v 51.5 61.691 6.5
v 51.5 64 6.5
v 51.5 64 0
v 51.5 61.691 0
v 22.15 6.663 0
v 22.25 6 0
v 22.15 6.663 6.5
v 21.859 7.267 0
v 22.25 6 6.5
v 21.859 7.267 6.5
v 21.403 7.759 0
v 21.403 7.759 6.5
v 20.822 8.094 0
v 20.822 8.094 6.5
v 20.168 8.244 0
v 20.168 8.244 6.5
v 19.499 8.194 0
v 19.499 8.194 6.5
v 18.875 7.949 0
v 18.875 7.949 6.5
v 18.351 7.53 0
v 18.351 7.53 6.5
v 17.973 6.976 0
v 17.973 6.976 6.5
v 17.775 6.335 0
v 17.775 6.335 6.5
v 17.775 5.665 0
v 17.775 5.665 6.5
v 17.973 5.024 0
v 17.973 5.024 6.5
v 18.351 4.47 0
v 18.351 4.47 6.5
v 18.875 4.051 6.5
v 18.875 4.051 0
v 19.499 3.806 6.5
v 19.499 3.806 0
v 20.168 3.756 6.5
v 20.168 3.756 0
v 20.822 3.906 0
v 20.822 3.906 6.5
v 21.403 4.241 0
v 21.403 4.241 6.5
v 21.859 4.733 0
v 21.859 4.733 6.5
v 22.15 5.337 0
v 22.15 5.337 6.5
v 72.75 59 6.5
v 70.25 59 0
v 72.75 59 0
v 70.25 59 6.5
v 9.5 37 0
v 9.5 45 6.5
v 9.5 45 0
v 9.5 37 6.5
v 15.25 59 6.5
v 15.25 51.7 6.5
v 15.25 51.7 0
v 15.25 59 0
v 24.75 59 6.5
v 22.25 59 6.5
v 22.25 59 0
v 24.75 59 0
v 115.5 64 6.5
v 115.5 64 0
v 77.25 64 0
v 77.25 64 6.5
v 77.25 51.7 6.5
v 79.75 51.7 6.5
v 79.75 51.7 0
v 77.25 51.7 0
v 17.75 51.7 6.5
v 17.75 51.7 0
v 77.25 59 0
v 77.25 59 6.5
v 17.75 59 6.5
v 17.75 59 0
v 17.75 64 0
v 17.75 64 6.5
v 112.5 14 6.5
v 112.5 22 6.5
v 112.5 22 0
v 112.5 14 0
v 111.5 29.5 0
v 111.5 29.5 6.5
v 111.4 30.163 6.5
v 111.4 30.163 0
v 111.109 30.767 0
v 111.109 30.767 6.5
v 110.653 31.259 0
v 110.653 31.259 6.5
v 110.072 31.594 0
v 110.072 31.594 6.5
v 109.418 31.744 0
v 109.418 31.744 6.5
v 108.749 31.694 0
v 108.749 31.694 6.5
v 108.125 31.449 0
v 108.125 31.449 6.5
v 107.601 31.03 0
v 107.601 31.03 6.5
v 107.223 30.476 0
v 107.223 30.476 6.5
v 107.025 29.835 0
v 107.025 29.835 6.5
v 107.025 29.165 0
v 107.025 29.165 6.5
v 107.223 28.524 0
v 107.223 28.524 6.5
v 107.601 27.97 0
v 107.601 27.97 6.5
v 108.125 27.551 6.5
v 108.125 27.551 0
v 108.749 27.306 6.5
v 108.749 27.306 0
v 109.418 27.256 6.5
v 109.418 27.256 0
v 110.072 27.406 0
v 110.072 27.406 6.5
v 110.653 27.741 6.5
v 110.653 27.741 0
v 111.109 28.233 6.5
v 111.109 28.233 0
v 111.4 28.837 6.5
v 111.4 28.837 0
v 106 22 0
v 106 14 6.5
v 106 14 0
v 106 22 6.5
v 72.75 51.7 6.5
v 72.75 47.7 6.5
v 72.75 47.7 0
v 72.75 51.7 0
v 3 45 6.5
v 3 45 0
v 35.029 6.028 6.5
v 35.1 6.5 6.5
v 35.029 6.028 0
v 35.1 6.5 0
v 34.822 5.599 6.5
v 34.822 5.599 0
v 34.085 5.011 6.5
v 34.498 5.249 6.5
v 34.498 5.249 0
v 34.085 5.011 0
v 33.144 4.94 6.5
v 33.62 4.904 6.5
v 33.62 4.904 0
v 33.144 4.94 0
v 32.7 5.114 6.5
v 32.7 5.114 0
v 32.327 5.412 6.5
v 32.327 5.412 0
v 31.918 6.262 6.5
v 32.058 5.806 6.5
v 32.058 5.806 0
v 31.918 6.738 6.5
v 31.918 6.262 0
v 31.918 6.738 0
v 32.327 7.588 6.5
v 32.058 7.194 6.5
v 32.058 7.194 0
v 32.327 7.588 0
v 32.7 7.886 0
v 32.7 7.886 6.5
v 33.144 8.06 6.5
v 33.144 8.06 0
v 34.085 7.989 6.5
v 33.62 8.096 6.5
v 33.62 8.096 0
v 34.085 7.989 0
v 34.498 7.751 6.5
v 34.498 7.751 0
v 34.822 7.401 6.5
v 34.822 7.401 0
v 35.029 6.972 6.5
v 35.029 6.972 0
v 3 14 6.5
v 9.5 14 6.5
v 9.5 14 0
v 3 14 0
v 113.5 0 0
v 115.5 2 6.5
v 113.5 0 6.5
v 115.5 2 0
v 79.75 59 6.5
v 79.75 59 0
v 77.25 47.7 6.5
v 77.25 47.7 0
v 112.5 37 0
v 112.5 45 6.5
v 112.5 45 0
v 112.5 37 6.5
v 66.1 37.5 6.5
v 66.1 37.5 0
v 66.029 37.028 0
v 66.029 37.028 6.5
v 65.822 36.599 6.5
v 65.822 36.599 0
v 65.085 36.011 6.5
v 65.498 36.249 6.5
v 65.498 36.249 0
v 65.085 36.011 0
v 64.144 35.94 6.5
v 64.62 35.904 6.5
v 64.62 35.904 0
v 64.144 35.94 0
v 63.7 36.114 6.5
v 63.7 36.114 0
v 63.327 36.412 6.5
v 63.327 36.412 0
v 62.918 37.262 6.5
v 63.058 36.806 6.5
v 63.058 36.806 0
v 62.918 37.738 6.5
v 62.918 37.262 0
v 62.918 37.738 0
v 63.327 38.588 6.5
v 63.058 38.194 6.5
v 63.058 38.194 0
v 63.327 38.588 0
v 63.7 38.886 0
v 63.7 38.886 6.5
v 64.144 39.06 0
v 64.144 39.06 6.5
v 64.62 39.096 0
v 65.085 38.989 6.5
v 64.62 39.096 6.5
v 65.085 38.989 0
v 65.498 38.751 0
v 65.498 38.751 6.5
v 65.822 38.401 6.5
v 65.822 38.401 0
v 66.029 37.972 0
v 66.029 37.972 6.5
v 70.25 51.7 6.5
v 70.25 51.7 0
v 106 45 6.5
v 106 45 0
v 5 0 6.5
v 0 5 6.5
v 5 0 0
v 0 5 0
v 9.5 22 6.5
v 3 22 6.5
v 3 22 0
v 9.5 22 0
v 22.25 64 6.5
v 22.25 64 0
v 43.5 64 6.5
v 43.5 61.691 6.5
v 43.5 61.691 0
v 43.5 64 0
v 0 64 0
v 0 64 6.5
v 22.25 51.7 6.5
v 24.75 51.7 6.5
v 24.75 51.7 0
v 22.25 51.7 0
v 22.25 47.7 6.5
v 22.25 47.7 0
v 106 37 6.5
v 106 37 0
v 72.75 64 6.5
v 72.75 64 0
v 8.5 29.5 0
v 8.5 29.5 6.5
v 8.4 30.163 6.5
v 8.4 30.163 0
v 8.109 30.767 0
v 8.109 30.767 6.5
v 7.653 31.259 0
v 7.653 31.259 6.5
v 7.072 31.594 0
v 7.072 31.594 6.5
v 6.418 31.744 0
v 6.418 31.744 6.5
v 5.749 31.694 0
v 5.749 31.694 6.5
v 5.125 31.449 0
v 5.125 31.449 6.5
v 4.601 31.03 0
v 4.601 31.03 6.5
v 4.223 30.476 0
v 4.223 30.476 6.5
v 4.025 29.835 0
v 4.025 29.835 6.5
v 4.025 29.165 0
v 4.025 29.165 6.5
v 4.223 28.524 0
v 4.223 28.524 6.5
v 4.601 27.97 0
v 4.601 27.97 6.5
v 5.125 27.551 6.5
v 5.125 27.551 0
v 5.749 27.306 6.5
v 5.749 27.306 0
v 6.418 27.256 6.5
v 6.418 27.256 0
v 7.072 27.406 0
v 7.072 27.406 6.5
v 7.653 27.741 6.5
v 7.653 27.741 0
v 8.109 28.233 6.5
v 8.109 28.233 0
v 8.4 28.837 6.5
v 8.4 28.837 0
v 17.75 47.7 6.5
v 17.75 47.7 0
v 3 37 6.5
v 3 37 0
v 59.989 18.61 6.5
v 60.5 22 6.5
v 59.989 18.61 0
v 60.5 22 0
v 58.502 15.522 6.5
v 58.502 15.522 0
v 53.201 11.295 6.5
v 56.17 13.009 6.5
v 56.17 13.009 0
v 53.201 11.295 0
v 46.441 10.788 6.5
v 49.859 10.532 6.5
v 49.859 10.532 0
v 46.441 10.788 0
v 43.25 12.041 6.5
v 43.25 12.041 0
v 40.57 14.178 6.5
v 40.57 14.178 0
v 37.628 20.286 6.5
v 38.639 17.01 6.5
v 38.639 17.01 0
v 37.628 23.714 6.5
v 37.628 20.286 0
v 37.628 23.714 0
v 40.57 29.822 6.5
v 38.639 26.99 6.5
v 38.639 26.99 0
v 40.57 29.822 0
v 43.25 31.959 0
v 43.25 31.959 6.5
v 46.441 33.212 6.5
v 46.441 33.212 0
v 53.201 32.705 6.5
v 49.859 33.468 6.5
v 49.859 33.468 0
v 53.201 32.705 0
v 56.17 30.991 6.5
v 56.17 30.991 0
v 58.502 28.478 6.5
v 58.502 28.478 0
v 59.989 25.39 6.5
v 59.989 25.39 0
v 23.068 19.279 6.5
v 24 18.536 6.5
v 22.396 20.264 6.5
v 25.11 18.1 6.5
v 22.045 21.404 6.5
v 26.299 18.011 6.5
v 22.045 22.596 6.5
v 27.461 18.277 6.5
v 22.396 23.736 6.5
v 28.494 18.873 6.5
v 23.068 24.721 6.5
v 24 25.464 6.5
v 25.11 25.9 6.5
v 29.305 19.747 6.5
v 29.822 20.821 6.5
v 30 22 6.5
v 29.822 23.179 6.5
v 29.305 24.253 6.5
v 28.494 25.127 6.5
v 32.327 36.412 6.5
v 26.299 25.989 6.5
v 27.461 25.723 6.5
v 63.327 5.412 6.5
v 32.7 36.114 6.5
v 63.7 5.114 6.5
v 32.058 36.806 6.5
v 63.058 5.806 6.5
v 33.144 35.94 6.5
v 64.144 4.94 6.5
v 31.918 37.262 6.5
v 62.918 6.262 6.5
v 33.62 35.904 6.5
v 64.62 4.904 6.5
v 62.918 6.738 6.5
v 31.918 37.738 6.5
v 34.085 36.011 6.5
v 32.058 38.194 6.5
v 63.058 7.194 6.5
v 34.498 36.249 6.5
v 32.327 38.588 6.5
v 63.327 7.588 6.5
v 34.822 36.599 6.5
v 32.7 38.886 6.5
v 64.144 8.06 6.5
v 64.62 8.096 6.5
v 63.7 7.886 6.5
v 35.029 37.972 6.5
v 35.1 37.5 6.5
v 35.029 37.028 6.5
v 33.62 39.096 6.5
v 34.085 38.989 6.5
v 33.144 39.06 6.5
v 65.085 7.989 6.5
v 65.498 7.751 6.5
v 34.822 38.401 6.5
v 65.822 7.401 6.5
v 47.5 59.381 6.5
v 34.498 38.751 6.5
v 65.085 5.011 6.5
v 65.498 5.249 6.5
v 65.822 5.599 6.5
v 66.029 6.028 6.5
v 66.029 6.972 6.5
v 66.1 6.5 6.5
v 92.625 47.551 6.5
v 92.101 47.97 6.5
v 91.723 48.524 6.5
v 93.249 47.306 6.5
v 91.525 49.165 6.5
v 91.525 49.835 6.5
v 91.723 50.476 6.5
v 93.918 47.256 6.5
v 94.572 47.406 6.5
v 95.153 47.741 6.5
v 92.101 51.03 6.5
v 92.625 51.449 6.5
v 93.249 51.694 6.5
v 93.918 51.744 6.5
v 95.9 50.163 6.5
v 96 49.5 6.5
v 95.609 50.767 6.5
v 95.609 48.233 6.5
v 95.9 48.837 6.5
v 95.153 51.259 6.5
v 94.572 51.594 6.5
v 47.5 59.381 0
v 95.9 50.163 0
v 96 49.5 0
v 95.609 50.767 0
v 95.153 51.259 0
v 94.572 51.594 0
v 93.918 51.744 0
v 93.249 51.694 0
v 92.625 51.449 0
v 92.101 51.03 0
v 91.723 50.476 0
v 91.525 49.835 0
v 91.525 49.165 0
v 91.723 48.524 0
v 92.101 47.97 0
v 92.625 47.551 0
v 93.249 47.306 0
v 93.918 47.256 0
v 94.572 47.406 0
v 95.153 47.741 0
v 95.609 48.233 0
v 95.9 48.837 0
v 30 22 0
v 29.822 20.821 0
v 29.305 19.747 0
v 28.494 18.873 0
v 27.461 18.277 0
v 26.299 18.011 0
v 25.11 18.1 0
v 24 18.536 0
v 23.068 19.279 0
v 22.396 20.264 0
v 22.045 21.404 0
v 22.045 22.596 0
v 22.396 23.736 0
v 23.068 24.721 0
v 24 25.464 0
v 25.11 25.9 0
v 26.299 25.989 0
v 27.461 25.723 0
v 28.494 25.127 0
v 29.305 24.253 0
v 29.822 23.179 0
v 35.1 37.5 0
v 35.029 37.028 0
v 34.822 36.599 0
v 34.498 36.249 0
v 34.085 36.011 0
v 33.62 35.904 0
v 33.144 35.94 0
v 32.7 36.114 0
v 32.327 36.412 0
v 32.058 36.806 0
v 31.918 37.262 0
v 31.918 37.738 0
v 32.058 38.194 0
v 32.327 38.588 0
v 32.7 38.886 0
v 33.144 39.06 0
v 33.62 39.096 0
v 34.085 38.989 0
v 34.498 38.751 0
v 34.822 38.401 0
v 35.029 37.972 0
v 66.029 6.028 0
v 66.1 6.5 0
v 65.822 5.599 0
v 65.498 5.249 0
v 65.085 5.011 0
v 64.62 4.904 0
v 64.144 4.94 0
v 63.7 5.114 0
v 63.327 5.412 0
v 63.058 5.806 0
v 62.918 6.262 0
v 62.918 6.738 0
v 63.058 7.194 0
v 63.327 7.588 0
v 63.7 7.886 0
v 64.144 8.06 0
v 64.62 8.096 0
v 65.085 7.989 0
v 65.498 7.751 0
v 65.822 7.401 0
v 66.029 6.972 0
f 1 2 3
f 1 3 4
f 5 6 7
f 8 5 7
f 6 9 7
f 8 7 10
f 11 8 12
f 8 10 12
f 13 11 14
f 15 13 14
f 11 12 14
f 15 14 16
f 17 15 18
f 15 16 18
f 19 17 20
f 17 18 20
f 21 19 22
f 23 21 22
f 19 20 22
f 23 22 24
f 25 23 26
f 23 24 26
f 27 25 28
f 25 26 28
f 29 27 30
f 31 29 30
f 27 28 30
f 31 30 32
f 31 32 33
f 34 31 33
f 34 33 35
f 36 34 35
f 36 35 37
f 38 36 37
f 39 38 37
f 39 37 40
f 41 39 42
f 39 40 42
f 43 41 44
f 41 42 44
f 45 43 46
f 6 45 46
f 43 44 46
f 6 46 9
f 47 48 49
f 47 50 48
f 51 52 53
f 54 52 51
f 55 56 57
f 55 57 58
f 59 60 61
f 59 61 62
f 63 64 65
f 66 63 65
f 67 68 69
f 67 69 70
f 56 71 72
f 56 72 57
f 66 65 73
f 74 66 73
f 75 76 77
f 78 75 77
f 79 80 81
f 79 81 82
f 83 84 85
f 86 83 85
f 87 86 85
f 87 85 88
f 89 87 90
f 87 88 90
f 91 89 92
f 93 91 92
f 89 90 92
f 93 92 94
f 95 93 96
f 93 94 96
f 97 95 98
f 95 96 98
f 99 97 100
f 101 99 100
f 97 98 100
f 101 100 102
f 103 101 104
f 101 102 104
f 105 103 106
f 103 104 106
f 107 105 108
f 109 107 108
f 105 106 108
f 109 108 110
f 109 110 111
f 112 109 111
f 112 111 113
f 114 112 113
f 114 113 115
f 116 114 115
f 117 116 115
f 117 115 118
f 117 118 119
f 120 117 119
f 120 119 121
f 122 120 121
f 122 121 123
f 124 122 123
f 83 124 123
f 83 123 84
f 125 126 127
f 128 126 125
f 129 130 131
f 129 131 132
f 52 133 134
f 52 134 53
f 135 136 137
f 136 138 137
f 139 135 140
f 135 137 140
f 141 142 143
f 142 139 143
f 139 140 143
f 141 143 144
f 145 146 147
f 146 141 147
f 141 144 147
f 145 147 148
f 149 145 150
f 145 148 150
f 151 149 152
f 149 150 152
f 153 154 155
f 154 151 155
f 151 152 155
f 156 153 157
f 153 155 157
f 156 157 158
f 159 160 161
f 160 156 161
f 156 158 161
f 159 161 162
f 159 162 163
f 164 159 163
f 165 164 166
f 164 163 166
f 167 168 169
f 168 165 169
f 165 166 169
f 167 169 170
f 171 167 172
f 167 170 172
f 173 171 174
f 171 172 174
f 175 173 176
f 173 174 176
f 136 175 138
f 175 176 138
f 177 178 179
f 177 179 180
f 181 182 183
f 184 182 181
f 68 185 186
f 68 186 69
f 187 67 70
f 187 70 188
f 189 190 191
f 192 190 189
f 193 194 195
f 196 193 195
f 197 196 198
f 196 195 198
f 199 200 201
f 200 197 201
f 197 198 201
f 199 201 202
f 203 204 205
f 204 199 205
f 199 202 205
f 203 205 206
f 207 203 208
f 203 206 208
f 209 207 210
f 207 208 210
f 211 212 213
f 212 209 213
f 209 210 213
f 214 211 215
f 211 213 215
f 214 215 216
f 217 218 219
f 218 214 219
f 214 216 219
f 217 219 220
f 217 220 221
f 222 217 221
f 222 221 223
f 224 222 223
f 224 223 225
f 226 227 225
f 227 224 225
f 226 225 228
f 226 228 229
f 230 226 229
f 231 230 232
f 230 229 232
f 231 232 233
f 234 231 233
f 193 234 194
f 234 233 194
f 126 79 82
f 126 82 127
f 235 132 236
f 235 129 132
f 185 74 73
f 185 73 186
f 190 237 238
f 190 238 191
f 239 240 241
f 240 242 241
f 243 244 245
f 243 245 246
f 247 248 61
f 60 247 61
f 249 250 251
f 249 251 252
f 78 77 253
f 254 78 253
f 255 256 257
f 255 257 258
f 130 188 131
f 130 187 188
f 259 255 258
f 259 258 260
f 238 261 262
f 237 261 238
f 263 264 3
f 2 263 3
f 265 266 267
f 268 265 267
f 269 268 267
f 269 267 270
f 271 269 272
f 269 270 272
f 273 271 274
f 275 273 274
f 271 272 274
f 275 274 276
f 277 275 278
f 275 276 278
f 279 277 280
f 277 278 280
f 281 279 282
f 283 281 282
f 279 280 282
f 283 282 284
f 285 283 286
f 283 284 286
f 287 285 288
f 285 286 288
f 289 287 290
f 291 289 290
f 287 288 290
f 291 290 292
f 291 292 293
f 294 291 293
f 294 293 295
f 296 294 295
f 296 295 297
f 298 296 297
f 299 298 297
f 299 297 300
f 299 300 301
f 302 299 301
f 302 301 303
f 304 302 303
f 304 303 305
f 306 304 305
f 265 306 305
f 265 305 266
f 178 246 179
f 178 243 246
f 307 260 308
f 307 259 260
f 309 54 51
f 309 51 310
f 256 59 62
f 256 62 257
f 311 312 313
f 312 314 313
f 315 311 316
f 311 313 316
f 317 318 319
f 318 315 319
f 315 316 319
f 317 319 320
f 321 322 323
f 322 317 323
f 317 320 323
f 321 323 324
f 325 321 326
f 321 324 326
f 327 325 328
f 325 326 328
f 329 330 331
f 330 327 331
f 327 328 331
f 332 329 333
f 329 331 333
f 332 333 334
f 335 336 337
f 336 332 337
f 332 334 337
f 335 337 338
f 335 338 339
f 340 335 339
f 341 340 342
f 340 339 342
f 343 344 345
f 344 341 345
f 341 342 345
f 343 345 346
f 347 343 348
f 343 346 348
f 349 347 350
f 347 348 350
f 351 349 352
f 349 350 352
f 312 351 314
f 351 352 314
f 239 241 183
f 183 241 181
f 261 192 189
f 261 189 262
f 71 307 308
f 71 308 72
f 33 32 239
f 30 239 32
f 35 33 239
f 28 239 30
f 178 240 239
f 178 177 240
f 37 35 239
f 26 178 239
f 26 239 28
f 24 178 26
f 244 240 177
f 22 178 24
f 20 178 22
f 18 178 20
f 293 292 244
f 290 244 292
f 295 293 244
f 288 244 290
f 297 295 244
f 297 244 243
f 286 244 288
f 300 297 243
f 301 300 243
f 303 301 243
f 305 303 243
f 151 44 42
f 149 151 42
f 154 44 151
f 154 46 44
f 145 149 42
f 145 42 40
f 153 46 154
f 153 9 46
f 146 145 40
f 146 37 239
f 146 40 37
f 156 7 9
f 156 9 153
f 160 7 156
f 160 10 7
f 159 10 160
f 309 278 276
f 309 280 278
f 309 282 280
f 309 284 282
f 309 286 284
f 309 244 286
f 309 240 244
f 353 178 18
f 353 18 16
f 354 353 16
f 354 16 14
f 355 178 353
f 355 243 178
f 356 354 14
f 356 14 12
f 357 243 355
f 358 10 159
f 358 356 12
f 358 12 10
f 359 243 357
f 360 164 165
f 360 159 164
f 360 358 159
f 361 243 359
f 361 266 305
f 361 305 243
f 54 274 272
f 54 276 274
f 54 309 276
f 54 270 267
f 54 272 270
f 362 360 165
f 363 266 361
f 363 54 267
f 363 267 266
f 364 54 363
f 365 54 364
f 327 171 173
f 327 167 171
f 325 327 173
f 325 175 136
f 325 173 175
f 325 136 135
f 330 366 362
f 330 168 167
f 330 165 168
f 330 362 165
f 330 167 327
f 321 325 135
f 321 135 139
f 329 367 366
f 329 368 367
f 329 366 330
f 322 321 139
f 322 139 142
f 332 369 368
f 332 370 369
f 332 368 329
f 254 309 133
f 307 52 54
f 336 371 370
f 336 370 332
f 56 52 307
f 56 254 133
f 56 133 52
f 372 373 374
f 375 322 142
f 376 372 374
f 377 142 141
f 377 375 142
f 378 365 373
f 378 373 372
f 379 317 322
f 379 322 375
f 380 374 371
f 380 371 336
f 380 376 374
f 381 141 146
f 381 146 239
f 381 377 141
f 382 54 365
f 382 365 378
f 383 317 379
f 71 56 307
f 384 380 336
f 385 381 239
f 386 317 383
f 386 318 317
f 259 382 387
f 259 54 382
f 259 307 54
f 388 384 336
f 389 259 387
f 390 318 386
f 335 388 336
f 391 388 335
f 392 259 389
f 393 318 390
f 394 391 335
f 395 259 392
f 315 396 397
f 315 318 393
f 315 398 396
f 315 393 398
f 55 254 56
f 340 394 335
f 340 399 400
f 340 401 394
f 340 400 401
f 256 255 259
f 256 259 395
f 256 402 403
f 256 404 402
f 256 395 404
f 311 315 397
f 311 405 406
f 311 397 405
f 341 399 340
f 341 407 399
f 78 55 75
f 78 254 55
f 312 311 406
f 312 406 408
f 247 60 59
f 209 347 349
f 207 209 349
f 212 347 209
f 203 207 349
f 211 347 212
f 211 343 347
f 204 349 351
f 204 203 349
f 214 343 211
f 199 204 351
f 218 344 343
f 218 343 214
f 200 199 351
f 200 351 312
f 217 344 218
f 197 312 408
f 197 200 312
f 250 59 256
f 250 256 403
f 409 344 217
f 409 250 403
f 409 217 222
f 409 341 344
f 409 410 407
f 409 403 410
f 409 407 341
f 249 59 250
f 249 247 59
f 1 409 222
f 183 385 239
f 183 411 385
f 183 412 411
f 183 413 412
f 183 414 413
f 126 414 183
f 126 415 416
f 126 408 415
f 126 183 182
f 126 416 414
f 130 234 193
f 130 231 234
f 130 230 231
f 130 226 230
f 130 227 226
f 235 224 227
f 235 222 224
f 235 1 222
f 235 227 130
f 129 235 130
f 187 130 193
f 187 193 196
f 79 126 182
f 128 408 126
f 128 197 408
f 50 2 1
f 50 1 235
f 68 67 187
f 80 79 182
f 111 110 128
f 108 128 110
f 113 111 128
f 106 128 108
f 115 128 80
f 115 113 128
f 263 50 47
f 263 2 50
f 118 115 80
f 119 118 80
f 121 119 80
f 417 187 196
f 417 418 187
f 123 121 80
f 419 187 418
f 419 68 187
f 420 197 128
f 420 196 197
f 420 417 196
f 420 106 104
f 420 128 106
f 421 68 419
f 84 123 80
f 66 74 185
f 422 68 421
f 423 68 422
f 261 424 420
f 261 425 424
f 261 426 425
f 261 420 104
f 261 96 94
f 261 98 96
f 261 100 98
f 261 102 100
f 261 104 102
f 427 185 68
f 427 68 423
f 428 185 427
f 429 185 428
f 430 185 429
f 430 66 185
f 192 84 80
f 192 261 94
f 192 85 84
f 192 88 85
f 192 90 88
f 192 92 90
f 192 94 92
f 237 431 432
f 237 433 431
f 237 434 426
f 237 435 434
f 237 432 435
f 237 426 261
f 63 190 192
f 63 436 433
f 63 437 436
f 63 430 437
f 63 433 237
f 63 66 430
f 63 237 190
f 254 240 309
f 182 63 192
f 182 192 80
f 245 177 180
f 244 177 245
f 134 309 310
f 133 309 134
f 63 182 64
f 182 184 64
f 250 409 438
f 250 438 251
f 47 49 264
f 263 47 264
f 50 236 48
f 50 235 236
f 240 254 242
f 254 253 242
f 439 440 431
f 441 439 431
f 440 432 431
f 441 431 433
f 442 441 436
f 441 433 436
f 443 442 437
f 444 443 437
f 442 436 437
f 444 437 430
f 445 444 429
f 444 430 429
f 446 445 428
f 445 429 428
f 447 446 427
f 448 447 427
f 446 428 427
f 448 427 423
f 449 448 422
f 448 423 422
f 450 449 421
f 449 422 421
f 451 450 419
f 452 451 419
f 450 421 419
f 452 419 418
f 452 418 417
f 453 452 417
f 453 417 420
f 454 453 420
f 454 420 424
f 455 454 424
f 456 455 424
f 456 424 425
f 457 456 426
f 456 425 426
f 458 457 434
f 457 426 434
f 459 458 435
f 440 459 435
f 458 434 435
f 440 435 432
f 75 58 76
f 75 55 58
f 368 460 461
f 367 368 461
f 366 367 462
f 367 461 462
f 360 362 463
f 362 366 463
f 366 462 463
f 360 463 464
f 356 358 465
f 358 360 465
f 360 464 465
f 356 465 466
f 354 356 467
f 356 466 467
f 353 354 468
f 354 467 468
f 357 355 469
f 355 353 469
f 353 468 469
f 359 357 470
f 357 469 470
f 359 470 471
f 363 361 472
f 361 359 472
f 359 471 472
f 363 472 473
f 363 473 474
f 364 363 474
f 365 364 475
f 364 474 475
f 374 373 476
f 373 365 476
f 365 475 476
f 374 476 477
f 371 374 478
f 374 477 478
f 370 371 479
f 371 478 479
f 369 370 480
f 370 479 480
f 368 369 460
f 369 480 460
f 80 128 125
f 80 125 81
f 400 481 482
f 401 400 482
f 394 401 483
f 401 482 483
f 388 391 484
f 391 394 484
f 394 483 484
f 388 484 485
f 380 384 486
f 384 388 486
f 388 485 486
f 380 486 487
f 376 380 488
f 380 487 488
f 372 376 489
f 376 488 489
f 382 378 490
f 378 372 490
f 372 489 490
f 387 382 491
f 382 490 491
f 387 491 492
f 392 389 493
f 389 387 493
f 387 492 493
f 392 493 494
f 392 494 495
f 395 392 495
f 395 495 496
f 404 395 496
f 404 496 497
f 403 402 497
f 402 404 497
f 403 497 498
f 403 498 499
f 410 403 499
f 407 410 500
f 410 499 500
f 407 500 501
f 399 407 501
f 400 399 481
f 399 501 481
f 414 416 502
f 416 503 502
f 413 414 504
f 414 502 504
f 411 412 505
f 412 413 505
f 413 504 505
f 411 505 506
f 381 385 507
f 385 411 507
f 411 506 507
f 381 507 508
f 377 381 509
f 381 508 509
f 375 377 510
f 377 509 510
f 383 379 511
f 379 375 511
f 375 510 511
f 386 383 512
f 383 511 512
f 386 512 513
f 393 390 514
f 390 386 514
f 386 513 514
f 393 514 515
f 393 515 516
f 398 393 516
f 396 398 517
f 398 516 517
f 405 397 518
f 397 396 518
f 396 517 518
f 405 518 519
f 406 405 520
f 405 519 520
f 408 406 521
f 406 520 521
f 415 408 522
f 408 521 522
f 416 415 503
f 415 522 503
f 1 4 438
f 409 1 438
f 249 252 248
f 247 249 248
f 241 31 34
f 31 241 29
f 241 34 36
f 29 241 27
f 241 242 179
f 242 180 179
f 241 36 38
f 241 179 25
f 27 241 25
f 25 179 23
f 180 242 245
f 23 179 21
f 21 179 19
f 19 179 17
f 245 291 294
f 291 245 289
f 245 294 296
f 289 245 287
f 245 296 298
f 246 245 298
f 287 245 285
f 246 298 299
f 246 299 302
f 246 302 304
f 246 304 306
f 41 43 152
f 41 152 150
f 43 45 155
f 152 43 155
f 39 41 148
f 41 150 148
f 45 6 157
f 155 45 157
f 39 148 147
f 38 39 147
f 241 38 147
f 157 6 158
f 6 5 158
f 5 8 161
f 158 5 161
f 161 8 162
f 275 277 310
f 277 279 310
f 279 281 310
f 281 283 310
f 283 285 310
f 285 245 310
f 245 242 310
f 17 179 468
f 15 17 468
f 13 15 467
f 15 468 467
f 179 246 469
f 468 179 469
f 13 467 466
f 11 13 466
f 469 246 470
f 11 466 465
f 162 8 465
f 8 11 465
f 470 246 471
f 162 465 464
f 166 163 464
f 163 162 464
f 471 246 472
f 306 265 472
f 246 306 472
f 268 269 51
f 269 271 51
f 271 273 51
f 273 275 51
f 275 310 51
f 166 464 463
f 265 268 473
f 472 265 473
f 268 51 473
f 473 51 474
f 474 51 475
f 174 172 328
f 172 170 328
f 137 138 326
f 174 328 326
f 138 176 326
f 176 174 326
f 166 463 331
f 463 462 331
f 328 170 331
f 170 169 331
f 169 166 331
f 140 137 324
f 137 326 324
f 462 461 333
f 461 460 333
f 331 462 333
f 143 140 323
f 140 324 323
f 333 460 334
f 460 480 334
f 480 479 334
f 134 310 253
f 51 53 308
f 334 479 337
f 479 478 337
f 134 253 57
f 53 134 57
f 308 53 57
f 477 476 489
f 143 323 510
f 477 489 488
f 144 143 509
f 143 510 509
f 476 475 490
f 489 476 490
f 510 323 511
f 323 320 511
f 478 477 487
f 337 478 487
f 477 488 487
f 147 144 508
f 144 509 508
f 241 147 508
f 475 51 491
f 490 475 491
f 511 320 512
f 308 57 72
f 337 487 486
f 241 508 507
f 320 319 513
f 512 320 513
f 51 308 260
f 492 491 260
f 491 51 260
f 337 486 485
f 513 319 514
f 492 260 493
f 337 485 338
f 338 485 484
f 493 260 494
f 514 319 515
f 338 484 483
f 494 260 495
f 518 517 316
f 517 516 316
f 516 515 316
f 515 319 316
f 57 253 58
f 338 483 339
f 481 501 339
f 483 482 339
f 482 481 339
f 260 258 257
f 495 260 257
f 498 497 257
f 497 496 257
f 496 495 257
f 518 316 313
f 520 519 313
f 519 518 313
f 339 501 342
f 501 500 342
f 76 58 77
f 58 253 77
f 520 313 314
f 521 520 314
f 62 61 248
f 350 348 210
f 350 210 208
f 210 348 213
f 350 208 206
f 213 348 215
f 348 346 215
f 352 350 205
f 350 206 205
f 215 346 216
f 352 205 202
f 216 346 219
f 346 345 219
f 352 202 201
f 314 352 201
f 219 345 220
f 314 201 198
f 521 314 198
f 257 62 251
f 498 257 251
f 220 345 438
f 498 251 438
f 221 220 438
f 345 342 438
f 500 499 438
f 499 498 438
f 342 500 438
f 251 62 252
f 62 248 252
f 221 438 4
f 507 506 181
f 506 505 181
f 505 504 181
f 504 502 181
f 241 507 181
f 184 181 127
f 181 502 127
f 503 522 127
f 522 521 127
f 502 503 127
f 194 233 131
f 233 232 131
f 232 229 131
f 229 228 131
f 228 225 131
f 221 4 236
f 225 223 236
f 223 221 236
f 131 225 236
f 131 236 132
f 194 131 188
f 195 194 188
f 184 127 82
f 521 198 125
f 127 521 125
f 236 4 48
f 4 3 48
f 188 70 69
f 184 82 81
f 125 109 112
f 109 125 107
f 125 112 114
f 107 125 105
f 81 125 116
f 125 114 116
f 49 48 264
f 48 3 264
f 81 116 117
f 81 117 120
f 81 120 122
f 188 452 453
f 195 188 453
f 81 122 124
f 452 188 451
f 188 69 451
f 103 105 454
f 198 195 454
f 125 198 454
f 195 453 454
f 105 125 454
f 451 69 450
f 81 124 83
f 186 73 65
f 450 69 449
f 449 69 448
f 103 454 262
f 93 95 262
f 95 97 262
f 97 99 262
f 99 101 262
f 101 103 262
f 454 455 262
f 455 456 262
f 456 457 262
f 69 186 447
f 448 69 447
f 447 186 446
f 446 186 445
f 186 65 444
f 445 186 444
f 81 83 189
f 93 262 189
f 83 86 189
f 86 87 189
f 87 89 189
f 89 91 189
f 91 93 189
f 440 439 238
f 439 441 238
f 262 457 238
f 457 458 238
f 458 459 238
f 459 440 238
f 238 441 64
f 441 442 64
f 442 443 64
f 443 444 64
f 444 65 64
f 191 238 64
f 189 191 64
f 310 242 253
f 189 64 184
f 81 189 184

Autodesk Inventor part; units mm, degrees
ref_plane "YZ Plane" through (0, 0, 0) normal (1, 0, 0) x (0, 1, 0)
ref_plane "XZ Plane" through (0, 0, 0) normal (0, 1, 0) x (-1, 0, 0)
ref_plane "XY Plane" through (0, 0, 0) normal (0, 0, 1) x (1, 0, 0)
sketch "Sketch1" plane through (0, 0, 0) normal (0, 0, 1) x (1, 0, 0)
  line L0 (5, 0) -> (115.5, 0)
  line L1 (115.5, 0) -> (115.5, 64)
  line L2 (115.5, 64) -> (0, 64)
  line L3 (0, 64) -> (0, 5)
  line L4 (0, 5) -> (5, 0)
  line L5 (33.5, 37.5) -> (64.5, 37.5) construction
  line L6 (64.5, 37.5) -> (64.5, 6.5) construction
  line L7 (64.5, 6.5) -> (33.5, 6.5) construction
  line L8 (33.5, 6.5) -> (33.5, 37.5) construction
  line L9 (27.62, 43.38) -> (70.38, 43.38) construction
  line L10 (70.38, 43.38) -> (70.38, 0.62) construction
  line L11 (70.38, 0.62) -> (27.62, 0.62) construction
  line L12 (27.62, 0.62) -> (27.62, 43.38) construction
  circle A0 centre (33.5, 6.5) radius 1.6
  circle A1 centre (64.5, 6.5) radius 1.6
  circle A2 centre (64.5, 37.5) radius 1.6
  circle A3 centre (33.5, 37.5) radius 1.6
  circle A4 centre (49, 22) radius 11.5
  circle A5 centre (26, 22) radius 4
  point P0 (0, 0)
  point P1 (49, 37.5)
  point P2 (64.5, 22)
  point P3 (70.38, 22)
  point P4 (49, 43.38)
  dimension "d0" = 45
  dimension "d1" = 31
  dimension "d2" = 42.76
  dimension "d3" = 3.2
  dimension "d4" = 23
  dimension "d5" = 8
  dimension "d6" = 23
  dimension "d8" = 115.5
  dimension "d9" = 42
  dimension "d10" = 5
  dimension "d11" = 22
  dimension "d63" = 26
extrude "Extrusion1" add sketch "Sketch1" along normal blind 6.5
sketch "Sketch3" plane through (0, 0, 6.5) normal (0, 0, 1) x (1, 0, 0)
  circle A0 centre (26, 22) radius 4 projected
  circle A1 centre (64.5, 37.5) radius 1.6 projected
  line L0 (5, 0) -> (115.5, 0) projected
  circle A2 centre (20, 6) radius 2.25
  circle A3 centre (93.75, 49.5) radius 2.25
  line L1 (115.5, 0) -> (115.5, 64) projected
  point P0 (0, 0)
  dimension "d29" = 4.5
  dimension "d30" = 6
  dimension "d31" = 6
  dimension "d32" = 12
  dimension "d64" = 21.75
extrude "Extrusion3" cut sketch "Sketch3" against normal through all contours A2 | A3
sketch "Sketch4" plane through (0, 0, 6.5) normal (0, 0, 1) x (1, 0, 0)
  line L0 (115.5, 0) -> (115.5, 64) projected
  line L1 (0, 64) -> (0, 5) projected
  line L2 (5, 0) -> (115.5, 0) projected
  line L3 (3, 22) -> (9.5, 22)
  line L4 (9.5, 22) -> (9.5, 14)
  line L5 (9.5, 14) -> (3, 14)
  line L6 (3, 14) -> (3, 22)
  line L7 (3, 45) -> (9.5, 45)
  line L8 (9.5, 45) -> (9.5, 37)
  line L9 (9.5, 37) -> (3, 37)
  line L10 (3, 37) -> (3, 45)
  line L11 (106, 45) -> (112.5, 45)
  line L12 (112.5, 45) -> (112.5, 37)
  line L13 (112.5, 37) -> (106, 37)
  line L14 (106, 37) -> (106, 45)
  line L15 (106, 22) -> (112.5, 22)
  line L16 (112.5, 22) -> (112.5, 14)
  line L17 (112.5, 14) -> (106, 14)
  line L18 (106, 14) -> (106, 22)
  line L19 (3, 37) -> (9.5, 22) construction
  line L20 (3, 22) -> (9.5, 37) construction
  line L21 (106, 37) -> (112.5, 22) construction
  line L22 (106, 22) -> (112.5, 37) construction
  circle A0 centre (6.25, 29.5) radius 2.25
  circle A1 centre (109.25, 29.5) radius 2.25
  point P0 (0, 0)
  dimension "d36" = 6.5
  dimension "d37" = 8
  dimension "d38" = 8
  dimension "d39" = 6.5
  dimension "d40" = 15
  dimension "d41" = 3
  dimension "d42" = 3
  dimension "d43" = 14
  dimension "d44" = 4.5
extrude "Extrusion4" cut sketch "Sketch4" against normal through all
sketch "Sketch5" plane through (0, 0, 6.5) normal (0, 0, 1) x (1, 0, 0)
  line L0 (115.5, 64) -> (0, 64) projected
  line L1 (0, 64) -> (0, 5) projected
  line L2 (17.75, 64) -> (22.25, 64)
  line L3 (22.25, 47.7) -> (17.75, 47.7)
  line L4 (24.75, 59) -> (24.75, 51.7)
  line L5 (15.25, 51.7) -> (15.25, 59)
  line L6 (17.75, 47.7) -> (17.75, 51.7)
  line L7 (17.75, 59) -> (17.75, 64)
  line L8 (22.25, 64) -> (22.25, 59)
  line L9 (22.25, 51.7) -> (22.25, 47.7)
  line L10 (15.25, 59) -> (17.75, 59)
  line L11 (22.25, 59) -> (24.75, 59)
  line L12 (24.75, 51.7) -> (22.25, 51.7)
  line L13 (17.75, 51.7) -> (15.25, 51.7)
  line L14 (72.75, 64) -> (77.25, 64)
  line L15 (77.25, 47.7) -> (72.75, 47.7)
  line L16 (79.75, 59) -> (79.75, 51.7)
  line L17 (70.25, 51.7) -> (70.25, 59)
  line L18 (72.75, 47.7) -> (72.75, 51.7)
  line L19 (72.75, 59) -> (72.75, 64)
  line L20 (77.25, 64) -> (77.25, 59)
  line L21 (77.25, 51.7) -> (77.25, 47.7)
  line L22 (70.25, 59) -> (72.75, 59)
  line L23 (77.25, 59) -> (79.75, 59)
  line L24 (79.75, 51.7) -> (77.25, 51.7)
  line L25 (72.75, 51.7) -> (70.25, 51.7)
  point P0 (0, 0)
  point P1 (20, 47.7)
  point P2 (75, 47.7)
  dimension "d47" = 4.5
  dimension "d48" = 2.5
  dimension "d49" = 2.5
  dimension "d50" = 5
  dimension "d51" = 7.3
  dimension "d52" = 4
  dimension "d53" = 4.5
  dimension "d54" = 2.5
  dimension "d55" = 2.5
  dimension "d56" = 5
  dimension "d57" = 7.3
  dimension "d58" = 4
  dimension "d59" = 20
  dimension "d60" = 55
extrude "Extrusion5" cut sketch "Sketch5" against normal through all
chamfer "Chamfer1" distance 2 angle 45 1 edges at (115.5, 0, 3.25)
sketch "Sketch6" plane through (0, 0, 6.5) normal (0, 0, 1) x (1, 0, 0)
  line L0 (72.75, 64) -> (22.25, 64) projected
  line L1 (47.5, 59.3812) -> (43.5, 61.6906)
  line L2 (43.5, 61.6906) -> (43.5, 64)
  line L3 (51.5, 64) -> (51.5, 61.6906)
  line L4 (51.5, 61.6906) -> (47.5, 59.3812)
  line L5 (43.5, 64) -> (51.5, 64)
  point P0 (0, 0)
  point P1 (47.5, 64)
  dimension "d68" = 8
extrude "Extrusion6" cut sketch "Sketch6" against normal through all
equation "\"d39\" = d36"
properties part number "z_motor_mount" material "Plywood, Finish"
